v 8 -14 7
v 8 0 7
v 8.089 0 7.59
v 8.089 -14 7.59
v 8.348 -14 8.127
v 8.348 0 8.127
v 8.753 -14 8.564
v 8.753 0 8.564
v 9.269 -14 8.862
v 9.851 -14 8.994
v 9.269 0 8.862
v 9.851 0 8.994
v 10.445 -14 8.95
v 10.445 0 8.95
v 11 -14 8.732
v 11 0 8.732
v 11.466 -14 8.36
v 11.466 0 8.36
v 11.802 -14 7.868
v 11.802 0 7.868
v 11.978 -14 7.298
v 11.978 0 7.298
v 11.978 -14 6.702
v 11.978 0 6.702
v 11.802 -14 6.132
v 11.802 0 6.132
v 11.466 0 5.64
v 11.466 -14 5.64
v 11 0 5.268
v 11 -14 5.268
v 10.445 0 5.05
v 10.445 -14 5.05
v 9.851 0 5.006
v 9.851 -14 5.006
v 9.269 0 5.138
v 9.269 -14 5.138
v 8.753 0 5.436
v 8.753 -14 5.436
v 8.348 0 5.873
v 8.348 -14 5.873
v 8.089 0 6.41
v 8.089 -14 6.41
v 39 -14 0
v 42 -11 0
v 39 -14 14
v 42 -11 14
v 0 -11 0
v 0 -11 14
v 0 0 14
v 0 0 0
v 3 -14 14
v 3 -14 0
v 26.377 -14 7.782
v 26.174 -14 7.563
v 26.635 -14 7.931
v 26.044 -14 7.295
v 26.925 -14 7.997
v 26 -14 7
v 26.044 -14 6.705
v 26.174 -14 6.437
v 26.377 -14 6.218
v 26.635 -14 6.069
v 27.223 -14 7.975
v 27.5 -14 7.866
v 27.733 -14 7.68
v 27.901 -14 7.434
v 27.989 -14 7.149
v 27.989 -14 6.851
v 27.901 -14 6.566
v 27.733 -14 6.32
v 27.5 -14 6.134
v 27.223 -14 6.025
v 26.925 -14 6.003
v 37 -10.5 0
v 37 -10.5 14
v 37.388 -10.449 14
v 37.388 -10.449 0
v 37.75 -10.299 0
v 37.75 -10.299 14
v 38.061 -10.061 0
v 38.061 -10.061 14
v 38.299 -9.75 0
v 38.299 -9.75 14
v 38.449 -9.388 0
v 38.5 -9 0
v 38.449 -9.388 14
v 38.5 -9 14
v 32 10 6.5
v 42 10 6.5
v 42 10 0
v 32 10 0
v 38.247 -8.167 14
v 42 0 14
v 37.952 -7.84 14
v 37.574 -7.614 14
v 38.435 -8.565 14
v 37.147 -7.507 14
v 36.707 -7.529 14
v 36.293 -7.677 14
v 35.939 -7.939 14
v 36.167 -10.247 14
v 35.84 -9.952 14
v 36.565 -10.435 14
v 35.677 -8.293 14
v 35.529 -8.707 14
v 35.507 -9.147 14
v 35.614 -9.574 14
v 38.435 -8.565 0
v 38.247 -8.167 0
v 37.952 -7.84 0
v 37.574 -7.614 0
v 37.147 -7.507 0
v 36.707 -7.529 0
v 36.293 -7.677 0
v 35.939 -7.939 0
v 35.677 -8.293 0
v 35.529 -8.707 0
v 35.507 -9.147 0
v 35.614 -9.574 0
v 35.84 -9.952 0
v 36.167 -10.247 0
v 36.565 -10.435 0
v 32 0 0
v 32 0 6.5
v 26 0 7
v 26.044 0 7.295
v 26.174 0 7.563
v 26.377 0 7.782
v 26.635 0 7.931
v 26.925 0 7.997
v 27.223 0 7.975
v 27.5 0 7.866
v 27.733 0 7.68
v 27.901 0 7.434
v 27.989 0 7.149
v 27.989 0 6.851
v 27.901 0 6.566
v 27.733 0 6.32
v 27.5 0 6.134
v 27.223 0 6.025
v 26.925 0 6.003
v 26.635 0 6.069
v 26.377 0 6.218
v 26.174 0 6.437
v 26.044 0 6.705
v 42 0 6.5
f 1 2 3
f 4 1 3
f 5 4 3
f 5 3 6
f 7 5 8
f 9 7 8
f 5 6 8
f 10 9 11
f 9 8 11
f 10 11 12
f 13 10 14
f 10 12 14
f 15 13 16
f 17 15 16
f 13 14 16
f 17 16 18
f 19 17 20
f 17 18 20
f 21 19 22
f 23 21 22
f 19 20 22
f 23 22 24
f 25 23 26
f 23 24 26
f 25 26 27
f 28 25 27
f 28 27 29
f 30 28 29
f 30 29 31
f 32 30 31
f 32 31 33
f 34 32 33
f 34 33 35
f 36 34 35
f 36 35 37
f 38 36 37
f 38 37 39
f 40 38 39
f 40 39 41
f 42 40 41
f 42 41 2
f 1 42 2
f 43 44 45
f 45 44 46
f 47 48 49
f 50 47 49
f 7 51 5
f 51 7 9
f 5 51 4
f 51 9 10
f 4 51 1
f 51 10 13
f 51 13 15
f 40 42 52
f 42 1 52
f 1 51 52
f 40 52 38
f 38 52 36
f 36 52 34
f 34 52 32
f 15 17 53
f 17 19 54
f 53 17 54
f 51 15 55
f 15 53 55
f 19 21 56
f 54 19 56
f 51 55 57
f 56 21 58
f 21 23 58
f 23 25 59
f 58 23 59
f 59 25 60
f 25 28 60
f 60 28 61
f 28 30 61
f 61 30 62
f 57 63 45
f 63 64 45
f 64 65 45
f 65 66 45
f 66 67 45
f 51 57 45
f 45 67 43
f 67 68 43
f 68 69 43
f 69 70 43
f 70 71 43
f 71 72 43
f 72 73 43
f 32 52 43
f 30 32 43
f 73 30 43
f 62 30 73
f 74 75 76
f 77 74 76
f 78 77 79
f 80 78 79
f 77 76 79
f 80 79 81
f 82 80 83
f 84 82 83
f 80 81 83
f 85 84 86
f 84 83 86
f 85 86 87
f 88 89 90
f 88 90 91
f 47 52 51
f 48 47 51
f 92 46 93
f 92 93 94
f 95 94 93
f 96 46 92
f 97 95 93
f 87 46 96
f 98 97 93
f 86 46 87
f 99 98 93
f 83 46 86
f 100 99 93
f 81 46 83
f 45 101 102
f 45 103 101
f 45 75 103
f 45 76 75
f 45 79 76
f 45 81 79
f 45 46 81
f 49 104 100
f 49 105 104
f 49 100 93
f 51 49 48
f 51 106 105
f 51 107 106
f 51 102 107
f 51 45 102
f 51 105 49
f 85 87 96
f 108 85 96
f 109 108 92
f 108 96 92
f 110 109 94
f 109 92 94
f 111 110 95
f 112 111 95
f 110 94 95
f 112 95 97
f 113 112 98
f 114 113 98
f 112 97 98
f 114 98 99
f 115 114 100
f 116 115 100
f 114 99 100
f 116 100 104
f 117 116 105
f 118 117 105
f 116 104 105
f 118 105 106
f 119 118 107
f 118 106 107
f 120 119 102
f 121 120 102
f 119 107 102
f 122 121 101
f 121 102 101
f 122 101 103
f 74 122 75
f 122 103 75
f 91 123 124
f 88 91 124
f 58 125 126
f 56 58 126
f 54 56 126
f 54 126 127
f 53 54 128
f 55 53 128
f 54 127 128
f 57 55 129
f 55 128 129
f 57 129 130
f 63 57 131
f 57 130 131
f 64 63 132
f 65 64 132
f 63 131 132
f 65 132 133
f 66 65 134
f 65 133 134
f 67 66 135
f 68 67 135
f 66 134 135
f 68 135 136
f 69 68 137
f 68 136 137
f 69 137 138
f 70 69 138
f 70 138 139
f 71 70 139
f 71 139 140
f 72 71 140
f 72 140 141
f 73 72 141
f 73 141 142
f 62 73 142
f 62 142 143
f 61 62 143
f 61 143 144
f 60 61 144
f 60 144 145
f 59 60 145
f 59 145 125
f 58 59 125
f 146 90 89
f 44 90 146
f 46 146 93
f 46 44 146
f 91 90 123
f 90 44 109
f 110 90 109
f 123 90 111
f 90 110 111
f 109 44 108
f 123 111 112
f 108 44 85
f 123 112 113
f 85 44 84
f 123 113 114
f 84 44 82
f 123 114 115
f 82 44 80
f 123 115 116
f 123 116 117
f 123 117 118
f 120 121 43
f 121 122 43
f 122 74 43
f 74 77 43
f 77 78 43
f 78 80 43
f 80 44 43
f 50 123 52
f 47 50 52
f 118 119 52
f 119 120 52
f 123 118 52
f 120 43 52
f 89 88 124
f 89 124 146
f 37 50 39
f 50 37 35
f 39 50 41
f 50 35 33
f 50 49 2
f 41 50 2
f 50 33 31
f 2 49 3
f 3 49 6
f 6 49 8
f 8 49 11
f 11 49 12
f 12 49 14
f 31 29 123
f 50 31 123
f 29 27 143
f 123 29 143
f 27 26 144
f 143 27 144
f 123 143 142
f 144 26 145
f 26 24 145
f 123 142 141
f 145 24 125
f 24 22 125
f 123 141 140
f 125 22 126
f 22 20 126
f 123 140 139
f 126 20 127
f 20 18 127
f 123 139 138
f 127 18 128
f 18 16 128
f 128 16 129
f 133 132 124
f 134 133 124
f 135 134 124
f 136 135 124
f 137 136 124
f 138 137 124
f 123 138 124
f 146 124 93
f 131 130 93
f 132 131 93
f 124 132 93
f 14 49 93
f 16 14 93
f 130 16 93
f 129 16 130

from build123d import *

# Parameters (mm, degrees)
F0_W      = 42
F0_H      = 14
F1_DEPTH  = 14
F3_DEPTH  = 25
F4_SIZE   = 3
F5_R      = 2
F6_DEPTH  = 25
F7_DEPTH  = 25
F8_W      = 10
F8_H      = 14
F9_DEPTH  = 10
F10_W     = 10
F10_H     = 10
F11_DEPTH = 7.5


with BuildPart() as f1:
    # F0 (on Top) → F1 (new body)
    with BuildSketch(Plane.XY):
        with Locations((21, -7)):
            Rectangle(F0_W, F0_H)
    extrude(amount=F1_DEPTH)

    # F2 (on face) → F3 (cut)
    with BuildSketch(Plane.XY.offset(14)):
        with BuildLine():
            ThreePointArc((37, -10.5), (38.06066, -10.06066), (38.5, -9))
            ThreePointArc((38.5, -9), (35.93934, -7.93934), (37, -10.5))
        make_face()
    extrude(amount=-F3_DEPTH, mode=Mode.SUBTRACT)

    # F4
    f4_edges = [f1.edges().sort_by_distance(p)[0] for p in [
        (0, -14, 7),
        (42, -14, 7),
    ]]
    chamfer(f4_edges, length=F4_SIZE)

    # F5 (on face) → F6 (cut)
    with BuildSketch(Plane(origin=(0, 0, 0), x_dir=(-1, 0, 0), z_dir=(0, 1, 0))):
        with BuildLine():
            ThreePointArc((-28, 7), (-27, 6), (-26, 7))
            ThreePointArc((-26, 7), (-27, 8), (-28, 7))
        make_face()
        with Locations((-10, 7)):
            Circle(F5_R)
    extrude(amount=-F6_DEPTH, mode=Mode.SUBTRACT)

    # F5 (on face) → F7 (cut)
    with BuildSketch(Plane(origin=(0, 0, 0), x_dir=(-1, 0, 0), z_dir=(0, 1, 0))):
        with BuildLine():
            ThreePointArc((-28, 7), (-27, 6), (-26, 7))
            ThreePointArc((-26, 7), (-27, 8), (-28, 7))
        make_face()
        with Locations((-10, 7)):
            Circle(F5_R)
    extrude(amount=-F7_DEPTH, mode=Mode.SUBTRACT)

    # F8 (on face) → F9 (join)
    with BuildSketch(Plane(origin=(0, 0, 0), x_dir=(-1, 0, 0), z_dir=(0, 1, 0))):
        with Locations((-37, 7)):
            Rectangle(F8_W, F8_H)
    extrude(amount=F9_DEPTH)

    # F10 (on face) → F11 (cut)
    with BuildSketch(Plane.XY.offset(14)):
        with Locations((37, 5)):
            Rectangle(F10_W, F10_H)
    extrude(amount=-F11_DEPTH, mode=Mode.SUBTRACT)


solid = f1.part
